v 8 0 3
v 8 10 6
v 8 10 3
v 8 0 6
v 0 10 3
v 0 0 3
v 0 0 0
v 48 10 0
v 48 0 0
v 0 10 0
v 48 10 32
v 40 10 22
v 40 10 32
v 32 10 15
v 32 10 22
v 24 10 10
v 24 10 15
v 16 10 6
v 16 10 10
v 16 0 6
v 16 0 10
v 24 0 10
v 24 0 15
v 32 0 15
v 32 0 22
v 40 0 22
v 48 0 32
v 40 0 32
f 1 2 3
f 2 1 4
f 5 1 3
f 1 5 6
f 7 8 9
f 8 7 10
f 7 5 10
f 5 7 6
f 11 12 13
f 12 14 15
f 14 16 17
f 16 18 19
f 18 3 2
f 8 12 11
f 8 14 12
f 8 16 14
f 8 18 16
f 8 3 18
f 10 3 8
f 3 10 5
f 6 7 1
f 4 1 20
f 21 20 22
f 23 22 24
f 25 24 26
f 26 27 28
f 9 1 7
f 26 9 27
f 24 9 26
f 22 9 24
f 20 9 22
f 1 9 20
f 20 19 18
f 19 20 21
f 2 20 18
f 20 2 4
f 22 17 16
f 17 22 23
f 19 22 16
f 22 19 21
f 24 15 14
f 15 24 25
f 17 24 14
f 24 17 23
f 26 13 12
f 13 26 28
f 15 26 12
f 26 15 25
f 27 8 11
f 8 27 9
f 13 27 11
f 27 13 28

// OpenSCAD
// Zweck: Funktionen, let, Listenausdrücke, Rekursion und Funktionsliterale steuern eine Treppe.
function sum(v, i = 0) = i >= len(v) ? 0 : v[i] + sum(v, i + 1);
function fib(n) = n < 2 ? n : fib(n - 1) + fib(n - 2);
function cumsum(v) = [for (i = [0 : len(v) - 1]) sum([for (j = [0 : i]) v[j]])];
steps = [for (i = [1 : 6]) fib(i) + 2];
heights = cumsum(steps);
dbl = function (x) x * 2;
echo(steps = steps, heights = heights, total = sum(steps));
echo(let(a = 3, b = a * a) [a, b], dbl(21), [for (s = steps) if (s % 2 == 0) s]);
for (i = [0 : len(steps) - 1])
    let(x = i * 8, h = heights[i])
        translate([x, 0, 0]) cube([8, 10, h]);
